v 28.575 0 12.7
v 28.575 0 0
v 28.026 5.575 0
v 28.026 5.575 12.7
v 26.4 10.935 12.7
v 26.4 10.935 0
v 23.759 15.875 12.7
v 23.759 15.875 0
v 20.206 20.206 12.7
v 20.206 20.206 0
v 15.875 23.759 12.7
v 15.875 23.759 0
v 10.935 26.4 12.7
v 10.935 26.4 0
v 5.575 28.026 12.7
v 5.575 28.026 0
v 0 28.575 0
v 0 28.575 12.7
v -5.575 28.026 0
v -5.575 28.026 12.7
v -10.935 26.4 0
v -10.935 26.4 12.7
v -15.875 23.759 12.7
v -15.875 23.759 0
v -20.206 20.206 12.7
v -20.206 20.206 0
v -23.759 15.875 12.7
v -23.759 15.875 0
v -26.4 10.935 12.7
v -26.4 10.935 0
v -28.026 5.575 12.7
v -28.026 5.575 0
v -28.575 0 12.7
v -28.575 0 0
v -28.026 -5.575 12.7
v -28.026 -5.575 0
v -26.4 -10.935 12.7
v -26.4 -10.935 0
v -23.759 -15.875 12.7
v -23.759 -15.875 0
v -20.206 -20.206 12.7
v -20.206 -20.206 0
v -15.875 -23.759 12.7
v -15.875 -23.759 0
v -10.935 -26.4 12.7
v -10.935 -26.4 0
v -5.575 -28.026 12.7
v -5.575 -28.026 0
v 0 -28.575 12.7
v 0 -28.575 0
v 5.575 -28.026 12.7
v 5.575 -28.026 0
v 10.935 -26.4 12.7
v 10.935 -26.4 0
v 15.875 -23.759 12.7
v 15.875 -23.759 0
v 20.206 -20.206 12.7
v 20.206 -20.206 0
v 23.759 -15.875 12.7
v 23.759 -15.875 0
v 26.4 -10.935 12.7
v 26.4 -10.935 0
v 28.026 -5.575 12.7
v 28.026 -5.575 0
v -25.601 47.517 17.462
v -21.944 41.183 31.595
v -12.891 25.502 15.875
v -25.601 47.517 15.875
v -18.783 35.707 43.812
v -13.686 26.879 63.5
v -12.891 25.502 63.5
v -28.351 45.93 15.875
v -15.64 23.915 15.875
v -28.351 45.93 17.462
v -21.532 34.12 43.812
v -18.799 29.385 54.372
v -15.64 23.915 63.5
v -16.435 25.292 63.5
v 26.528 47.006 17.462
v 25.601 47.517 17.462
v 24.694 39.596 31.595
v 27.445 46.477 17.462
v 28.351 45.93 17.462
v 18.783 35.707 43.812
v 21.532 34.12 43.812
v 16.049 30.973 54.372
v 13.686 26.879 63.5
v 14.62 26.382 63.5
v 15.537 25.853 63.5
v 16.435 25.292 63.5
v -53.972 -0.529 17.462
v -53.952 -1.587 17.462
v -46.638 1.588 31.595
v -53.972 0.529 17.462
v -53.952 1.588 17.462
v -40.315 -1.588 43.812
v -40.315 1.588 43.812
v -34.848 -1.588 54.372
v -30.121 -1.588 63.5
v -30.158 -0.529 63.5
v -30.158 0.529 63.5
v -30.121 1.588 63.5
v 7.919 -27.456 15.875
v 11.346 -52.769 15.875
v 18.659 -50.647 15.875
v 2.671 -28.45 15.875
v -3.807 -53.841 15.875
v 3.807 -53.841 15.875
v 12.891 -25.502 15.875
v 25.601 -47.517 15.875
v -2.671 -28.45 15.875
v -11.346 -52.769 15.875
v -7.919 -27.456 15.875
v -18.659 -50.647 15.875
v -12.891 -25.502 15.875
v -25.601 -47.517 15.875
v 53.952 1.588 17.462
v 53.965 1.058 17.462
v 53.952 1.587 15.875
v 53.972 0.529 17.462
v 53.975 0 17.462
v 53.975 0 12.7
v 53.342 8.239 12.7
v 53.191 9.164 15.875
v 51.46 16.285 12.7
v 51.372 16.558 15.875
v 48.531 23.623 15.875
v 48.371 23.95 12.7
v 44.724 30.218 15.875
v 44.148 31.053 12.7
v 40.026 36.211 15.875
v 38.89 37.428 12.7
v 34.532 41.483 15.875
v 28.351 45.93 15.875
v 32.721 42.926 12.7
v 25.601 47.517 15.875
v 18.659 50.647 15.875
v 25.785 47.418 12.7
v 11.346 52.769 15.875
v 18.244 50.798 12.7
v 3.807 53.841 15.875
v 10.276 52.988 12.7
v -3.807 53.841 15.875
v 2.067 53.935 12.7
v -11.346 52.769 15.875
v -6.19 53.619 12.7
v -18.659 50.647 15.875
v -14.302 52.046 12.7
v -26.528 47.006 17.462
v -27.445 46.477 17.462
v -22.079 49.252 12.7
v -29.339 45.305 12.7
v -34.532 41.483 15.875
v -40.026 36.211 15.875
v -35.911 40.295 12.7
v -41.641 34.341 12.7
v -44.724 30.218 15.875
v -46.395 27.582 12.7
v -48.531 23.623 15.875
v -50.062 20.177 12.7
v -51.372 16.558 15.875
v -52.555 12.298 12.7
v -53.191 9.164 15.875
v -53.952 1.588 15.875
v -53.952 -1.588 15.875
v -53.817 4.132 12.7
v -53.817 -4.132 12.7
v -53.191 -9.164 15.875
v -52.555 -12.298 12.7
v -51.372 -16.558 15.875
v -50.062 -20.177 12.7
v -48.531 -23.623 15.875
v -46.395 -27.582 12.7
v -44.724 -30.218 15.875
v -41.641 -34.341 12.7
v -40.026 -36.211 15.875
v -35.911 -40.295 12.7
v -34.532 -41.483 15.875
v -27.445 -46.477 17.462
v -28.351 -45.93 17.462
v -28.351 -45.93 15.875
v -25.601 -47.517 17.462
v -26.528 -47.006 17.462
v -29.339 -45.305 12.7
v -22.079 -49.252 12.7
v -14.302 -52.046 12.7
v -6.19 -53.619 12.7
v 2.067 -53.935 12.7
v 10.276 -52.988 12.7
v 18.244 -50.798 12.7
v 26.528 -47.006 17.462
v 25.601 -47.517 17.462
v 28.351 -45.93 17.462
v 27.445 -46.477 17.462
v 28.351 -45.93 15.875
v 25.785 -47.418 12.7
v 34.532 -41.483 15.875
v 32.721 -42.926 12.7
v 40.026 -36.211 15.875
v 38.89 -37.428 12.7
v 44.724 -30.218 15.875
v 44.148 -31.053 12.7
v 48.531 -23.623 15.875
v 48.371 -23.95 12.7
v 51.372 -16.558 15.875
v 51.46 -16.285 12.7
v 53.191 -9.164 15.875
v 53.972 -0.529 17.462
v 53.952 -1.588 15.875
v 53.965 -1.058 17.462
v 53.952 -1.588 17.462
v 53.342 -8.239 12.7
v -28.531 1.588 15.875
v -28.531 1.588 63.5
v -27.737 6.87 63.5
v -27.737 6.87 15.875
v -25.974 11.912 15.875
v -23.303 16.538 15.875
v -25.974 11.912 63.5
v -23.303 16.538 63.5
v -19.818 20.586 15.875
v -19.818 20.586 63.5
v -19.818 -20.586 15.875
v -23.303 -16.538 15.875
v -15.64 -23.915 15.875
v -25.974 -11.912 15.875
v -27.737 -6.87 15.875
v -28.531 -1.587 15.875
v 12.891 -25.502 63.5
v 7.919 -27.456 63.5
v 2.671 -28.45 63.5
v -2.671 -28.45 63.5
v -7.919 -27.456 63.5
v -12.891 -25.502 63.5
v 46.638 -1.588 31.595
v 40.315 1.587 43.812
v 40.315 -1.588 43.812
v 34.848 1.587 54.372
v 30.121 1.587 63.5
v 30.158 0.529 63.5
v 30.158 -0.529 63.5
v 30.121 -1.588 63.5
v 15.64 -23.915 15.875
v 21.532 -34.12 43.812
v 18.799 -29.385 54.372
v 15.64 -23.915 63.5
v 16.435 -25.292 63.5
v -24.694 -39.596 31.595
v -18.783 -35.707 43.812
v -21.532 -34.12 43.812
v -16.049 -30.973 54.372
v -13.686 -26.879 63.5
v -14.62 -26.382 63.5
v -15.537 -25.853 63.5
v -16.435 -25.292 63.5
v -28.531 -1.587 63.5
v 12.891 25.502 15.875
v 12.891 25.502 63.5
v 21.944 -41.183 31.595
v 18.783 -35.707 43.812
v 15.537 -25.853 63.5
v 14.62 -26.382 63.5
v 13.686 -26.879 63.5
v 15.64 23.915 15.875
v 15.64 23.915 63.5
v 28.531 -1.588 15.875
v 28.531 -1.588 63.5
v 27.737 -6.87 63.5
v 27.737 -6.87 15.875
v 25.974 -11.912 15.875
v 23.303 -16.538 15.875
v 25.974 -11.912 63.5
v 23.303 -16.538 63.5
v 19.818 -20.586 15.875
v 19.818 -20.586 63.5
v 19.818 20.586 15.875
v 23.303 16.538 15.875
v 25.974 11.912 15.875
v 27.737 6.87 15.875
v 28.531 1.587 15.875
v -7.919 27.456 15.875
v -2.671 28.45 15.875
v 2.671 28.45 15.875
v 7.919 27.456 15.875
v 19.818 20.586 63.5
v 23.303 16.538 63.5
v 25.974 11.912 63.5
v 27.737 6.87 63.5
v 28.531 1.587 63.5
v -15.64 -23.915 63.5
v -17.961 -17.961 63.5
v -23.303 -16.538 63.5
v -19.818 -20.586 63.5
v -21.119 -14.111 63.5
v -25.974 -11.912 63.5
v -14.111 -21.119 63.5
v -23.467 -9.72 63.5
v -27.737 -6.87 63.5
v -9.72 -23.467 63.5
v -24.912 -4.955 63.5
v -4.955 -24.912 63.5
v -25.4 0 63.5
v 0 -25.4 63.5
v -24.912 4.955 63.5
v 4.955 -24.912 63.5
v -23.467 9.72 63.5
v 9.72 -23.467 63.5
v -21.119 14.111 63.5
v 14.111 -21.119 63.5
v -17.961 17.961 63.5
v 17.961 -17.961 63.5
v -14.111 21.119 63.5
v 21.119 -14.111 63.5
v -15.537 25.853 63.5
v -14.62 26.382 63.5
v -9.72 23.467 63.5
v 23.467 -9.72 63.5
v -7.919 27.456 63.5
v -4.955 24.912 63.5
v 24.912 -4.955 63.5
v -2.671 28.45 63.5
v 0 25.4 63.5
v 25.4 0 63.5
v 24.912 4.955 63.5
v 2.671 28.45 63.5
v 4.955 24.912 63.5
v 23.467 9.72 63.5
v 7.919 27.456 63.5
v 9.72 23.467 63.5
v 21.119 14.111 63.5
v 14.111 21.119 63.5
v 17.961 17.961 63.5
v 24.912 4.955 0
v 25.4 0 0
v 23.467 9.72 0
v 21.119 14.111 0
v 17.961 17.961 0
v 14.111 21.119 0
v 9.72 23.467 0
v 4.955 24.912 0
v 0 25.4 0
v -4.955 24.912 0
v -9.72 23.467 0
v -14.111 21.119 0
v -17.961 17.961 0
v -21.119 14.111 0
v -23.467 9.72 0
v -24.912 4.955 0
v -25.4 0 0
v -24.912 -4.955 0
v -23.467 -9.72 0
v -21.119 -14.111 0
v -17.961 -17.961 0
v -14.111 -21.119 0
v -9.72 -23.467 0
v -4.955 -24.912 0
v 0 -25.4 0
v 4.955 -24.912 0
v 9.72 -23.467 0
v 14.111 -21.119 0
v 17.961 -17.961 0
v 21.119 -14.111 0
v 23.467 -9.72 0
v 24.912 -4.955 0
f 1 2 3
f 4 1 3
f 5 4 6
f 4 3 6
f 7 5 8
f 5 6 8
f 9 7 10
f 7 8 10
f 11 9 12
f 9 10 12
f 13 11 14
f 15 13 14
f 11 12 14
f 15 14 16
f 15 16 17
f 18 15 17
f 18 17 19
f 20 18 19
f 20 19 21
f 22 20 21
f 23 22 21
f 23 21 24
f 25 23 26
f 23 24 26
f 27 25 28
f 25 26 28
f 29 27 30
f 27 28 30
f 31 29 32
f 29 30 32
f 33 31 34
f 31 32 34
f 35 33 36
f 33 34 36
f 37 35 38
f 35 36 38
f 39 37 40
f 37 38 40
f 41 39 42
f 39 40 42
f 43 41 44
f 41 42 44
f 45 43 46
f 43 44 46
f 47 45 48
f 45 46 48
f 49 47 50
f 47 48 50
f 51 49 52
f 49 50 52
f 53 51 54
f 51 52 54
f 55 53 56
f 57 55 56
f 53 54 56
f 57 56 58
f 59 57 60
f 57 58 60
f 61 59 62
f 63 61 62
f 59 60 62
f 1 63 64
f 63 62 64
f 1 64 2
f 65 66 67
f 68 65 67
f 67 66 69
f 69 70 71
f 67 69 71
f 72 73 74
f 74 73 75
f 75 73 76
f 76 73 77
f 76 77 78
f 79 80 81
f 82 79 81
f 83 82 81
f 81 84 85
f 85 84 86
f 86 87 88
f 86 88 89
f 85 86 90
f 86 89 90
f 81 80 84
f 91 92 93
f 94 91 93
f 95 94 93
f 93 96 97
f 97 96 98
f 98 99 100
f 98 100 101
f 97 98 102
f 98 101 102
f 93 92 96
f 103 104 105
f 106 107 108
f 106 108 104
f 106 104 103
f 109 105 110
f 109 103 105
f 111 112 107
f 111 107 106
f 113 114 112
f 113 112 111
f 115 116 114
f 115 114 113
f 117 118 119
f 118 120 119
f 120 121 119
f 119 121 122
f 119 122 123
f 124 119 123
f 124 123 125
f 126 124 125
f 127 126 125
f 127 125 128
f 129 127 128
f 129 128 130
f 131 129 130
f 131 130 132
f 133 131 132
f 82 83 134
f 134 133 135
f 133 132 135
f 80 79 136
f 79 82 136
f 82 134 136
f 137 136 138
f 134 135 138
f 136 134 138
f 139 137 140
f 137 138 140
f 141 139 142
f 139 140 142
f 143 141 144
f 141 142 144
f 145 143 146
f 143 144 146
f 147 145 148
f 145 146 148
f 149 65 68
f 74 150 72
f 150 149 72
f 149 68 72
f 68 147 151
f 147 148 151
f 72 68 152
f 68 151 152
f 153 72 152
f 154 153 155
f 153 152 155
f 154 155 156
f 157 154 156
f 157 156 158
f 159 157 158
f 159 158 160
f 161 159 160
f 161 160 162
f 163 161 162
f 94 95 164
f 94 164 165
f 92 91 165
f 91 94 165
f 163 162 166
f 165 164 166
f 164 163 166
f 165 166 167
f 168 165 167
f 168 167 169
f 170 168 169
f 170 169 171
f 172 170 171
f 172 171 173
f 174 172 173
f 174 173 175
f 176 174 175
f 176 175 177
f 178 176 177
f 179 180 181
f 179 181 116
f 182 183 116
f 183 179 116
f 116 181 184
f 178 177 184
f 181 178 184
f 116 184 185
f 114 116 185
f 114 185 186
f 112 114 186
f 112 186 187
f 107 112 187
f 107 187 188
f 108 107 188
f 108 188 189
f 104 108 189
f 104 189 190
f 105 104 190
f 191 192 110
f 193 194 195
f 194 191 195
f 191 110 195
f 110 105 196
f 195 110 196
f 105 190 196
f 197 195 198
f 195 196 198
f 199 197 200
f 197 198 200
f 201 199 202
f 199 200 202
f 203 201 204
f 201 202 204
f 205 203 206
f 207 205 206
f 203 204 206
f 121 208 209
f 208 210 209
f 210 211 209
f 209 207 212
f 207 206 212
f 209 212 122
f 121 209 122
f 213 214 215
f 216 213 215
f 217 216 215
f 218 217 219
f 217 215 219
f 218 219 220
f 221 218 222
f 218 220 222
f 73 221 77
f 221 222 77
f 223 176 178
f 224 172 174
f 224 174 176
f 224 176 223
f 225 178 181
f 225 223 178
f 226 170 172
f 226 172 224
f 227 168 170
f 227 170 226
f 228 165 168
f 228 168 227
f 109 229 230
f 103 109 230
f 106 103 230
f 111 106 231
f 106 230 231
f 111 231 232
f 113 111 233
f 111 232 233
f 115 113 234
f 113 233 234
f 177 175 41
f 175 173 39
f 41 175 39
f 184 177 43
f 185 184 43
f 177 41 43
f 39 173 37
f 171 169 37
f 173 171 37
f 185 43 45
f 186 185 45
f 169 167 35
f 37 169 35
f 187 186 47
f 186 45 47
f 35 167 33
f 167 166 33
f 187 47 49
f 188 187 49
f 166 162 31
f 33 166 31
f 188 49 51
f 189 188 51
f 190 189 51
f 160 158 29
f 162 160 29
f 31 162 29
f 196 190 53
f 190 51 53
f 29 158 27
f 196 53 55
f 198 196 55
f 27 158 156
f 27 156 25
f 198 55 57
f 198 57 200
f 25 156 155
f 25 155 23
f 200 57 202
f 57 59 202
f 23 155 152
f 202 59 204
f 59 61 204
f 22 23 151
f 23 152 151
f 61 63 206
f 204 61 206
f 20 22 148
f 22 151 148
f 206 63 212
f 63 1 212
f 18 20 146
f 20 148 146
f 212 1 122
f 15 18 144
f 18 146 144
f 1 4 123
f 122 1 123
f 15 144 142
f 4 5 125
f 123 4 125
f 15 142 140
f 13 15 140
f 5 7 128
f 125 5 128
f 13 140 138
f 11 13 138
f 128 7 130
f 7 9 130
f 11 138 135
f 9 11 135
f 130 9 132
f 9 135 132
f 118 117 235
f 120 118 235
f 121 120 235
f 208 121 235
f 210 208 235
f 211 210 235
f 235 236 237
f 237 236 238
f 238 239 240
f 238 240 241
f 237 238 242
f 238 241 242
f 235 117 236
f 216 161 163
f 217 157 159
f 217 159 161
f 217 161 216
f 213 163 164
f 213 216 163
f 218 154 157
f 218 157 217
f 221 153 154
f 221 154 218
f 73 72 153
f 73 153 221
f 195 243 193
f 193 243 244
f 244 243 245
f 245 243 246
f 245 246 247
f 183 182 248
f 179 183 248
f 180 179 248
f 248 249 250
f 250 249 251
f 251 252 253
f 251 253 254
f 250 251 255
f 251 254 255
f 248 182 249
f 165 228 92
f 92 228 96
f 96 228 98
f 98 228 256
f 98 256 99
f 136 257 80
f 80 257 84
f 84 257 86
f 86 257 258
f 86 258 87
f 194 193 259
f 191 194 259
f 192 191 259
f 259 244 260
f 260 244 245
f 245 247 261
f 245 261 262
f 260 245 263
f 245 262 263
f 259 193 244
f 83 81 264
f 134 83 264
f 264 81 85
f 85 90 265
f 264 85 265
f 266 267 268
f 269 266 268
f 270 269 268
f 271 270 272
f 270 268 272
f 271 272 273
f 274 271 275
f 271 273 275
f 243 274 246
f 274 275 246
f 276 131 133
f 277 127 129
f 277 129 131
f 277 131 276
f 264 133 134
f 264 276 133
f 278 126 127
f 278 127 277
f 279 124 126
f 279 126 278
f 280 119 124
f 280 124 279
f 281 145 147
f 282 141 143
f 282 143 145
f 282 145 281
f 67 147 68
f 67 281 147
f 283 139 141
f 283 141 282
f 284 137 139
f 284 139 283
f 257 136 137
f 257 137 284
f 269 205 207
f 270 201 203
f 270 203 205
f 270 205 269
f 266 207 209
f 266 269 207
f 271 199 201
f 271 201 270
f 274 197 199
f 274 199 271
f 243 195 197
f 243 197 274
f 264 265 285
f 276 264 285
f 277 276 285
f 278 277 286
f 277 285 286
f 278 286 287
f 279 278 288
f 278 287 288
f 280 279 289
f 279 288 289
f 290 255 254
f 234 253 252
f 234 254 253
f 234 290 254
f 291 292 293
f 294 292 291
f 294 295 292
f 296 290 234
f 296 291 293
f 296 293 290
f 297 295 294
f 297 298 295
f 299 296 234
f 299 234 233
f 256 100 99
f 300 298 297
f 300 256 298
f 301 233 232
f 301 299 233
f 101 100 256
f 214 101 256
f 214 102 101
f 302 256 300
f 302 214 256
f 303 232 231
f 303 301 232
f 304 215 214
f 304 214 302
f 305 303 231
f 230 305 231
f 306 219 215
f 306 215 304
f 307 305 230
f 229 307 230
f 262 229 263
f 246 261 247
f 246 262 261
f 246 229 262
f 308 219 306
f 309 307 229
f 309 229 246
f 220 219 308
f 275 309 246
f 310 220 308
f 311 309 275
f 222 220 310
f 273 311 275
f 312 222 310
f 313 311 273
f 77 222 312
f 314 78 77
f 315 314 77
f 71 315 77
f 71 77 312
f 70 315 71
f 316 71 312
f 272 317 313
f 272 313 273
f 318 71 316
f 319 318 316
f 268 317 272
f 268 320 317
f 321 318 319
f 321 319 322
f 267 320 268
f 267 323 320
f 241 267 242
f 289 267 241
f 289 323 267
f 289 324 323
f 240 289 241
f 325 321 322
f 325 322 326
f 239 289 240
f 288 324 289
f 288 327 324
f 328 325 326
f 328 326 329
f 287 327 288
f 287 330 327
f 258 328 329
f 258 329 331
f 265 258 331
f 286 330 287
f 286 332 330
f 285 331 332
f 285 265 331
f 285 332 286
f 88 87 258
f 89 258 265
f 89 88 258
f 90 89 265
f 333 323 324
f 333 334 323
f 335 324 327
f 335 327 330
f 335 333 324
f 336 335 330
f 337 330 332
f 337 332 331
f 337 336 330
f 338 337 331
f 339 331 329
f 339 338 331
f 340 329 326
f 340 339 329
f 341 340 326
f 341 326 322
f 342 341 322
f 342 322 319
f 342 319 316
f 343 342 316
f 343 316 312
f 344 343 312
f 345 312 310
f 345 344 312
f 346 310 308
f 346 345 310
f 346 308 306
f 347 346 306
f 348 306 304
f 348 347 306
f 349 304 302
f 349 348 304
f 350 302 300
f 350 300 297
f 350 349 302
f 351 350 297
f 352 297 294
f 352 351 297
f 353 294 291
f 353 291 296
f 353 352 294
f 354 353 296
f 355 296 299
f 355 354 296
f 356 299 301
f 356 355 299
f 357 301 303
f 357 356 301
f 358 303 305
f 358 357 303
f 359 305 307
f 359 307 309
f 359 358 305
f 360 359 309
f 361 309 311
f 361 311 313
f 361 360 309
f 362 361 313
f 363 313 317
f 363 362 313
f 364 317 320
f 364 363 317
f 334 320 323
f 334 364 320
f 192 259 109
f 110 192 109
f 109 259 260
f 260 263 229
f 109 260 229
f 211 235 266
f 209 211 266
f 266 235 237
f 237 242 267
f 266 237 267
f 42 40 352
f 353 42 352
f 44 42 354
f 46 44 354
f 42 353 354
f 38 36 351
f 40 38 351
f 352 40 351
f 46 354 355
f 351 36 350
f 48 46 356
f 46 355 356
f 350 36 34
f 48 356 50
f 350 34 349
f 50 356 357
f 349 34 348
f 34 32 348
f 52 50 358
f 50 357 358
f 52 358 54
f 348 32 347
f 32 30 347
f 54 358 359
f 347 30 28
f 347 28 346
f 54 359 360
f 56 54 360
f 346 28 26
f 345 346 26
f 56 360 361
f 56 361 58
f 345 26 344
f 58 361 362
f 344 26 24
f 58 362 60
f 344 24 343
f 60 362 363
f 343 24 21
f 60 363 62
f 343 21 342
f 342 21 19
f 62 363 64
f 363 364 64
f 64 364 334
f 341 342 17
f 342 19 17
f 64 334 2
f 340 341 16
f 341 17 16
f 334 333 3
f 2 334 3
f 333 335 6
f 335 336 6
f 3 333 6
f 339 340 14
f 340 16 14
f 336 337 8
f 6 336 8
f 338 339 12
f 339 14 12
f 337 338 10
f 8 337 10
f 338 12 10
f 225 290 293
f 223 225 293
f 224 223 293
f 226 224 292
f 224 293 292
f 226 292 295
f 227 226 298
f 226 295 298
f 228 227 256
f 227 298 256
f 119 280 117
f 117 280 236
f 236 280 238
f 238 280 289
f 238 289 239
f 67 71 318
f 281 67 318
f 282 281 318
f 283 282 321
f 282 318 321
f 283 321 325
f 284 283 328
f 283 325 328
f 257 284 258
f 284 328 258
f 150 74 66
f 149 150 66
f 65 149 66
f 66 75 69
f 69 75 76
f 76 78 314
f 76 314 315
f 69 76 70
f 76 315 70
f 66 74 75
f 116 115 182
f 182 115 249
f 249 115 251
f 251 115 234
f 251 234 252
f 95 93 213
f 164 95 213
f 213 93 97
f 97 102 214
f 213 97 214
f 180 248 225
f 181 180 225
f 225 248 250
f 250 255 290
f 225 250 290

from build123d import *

# Parameters (mm, degrees)
F0_R            = 28.575
F0_R_2          = 25.4
F1_DEPTH        = 12.7
F2_R            = 53.975
F2_R_2          = 25.4
F3_DEPTH        = 50.8
F6_DEPTH        = 47.625
F6_COPIES_COUNT = 6


# Not quite as in the source:
# - a pattern or mirror of a feature is missing from the dataset's text; its kind, count and spacing are read off the source's solid


with BuildPart() as f1:
    # F0 (on Top) → F1 (new body)
    with BuildSketch(Plane.XY):
        Circle(F0_R)
        Circle(F0_R_2, mode=Mode.SUBTRACT)
    extrude(amount=F1_DEPTH)

    # F2 (on face) → F3 (join)
    with BuildSketch(Plane.XY.offset(12.7)):
        Circle(F2_R)
        Circle(F2_R_2, mode=Mode.SUBTRACT)
    extrude(amount=F3_DEPTH)

    # F5 (on face) → F6 (cut, through all)
    with BuildSketch(Plane.XY.offset(63.5)):
        with BuildLine():
            ThreePointArc((-15.6402496783, -23.9147070858), (-24.7466759131, -14.2875), (-28.5308686995, -1.5875))
            Line((-28.5308686995, -1.5875), (-53.9516493608, -1.5875))
            ThreePointArc((-53.9516493608, -1.5875), (-46.7437211693, -26.9875), (-28.3506400089, -45.9297489225))
            Line((-28.3506400089, -45.9297489225), (-15.6402496783, -23.9147070858))
        make_face()
    f6 = extrude(amount=-F6_DEPTH, mode=Mode.SUBTRACT)

    # F6_copies: F6 ×6 about axis
    f6_copies_axis = Axis((0, 0, 0), (0, 0, 1))
    for i in range(1, F6_COPIES_COUNT):
        add(f6.rotate(f6_copies_axis, i * 360 / F6_COPIES_COUNT), mode=Mode.SUBTRACT)

    # F7 (on Front) → F8 (revolve, cut)
    with BuildSketch(Plane.XZ):
        Polygon((-53.975, 17.4625), (-30.1625, 63.5), (-53.975, 63.5), align=None)
    revolve(axis=Axis((0, 0, 0), (0, 0, -1)), mode=Mode.SUBTRACT)


solid = f1.part
